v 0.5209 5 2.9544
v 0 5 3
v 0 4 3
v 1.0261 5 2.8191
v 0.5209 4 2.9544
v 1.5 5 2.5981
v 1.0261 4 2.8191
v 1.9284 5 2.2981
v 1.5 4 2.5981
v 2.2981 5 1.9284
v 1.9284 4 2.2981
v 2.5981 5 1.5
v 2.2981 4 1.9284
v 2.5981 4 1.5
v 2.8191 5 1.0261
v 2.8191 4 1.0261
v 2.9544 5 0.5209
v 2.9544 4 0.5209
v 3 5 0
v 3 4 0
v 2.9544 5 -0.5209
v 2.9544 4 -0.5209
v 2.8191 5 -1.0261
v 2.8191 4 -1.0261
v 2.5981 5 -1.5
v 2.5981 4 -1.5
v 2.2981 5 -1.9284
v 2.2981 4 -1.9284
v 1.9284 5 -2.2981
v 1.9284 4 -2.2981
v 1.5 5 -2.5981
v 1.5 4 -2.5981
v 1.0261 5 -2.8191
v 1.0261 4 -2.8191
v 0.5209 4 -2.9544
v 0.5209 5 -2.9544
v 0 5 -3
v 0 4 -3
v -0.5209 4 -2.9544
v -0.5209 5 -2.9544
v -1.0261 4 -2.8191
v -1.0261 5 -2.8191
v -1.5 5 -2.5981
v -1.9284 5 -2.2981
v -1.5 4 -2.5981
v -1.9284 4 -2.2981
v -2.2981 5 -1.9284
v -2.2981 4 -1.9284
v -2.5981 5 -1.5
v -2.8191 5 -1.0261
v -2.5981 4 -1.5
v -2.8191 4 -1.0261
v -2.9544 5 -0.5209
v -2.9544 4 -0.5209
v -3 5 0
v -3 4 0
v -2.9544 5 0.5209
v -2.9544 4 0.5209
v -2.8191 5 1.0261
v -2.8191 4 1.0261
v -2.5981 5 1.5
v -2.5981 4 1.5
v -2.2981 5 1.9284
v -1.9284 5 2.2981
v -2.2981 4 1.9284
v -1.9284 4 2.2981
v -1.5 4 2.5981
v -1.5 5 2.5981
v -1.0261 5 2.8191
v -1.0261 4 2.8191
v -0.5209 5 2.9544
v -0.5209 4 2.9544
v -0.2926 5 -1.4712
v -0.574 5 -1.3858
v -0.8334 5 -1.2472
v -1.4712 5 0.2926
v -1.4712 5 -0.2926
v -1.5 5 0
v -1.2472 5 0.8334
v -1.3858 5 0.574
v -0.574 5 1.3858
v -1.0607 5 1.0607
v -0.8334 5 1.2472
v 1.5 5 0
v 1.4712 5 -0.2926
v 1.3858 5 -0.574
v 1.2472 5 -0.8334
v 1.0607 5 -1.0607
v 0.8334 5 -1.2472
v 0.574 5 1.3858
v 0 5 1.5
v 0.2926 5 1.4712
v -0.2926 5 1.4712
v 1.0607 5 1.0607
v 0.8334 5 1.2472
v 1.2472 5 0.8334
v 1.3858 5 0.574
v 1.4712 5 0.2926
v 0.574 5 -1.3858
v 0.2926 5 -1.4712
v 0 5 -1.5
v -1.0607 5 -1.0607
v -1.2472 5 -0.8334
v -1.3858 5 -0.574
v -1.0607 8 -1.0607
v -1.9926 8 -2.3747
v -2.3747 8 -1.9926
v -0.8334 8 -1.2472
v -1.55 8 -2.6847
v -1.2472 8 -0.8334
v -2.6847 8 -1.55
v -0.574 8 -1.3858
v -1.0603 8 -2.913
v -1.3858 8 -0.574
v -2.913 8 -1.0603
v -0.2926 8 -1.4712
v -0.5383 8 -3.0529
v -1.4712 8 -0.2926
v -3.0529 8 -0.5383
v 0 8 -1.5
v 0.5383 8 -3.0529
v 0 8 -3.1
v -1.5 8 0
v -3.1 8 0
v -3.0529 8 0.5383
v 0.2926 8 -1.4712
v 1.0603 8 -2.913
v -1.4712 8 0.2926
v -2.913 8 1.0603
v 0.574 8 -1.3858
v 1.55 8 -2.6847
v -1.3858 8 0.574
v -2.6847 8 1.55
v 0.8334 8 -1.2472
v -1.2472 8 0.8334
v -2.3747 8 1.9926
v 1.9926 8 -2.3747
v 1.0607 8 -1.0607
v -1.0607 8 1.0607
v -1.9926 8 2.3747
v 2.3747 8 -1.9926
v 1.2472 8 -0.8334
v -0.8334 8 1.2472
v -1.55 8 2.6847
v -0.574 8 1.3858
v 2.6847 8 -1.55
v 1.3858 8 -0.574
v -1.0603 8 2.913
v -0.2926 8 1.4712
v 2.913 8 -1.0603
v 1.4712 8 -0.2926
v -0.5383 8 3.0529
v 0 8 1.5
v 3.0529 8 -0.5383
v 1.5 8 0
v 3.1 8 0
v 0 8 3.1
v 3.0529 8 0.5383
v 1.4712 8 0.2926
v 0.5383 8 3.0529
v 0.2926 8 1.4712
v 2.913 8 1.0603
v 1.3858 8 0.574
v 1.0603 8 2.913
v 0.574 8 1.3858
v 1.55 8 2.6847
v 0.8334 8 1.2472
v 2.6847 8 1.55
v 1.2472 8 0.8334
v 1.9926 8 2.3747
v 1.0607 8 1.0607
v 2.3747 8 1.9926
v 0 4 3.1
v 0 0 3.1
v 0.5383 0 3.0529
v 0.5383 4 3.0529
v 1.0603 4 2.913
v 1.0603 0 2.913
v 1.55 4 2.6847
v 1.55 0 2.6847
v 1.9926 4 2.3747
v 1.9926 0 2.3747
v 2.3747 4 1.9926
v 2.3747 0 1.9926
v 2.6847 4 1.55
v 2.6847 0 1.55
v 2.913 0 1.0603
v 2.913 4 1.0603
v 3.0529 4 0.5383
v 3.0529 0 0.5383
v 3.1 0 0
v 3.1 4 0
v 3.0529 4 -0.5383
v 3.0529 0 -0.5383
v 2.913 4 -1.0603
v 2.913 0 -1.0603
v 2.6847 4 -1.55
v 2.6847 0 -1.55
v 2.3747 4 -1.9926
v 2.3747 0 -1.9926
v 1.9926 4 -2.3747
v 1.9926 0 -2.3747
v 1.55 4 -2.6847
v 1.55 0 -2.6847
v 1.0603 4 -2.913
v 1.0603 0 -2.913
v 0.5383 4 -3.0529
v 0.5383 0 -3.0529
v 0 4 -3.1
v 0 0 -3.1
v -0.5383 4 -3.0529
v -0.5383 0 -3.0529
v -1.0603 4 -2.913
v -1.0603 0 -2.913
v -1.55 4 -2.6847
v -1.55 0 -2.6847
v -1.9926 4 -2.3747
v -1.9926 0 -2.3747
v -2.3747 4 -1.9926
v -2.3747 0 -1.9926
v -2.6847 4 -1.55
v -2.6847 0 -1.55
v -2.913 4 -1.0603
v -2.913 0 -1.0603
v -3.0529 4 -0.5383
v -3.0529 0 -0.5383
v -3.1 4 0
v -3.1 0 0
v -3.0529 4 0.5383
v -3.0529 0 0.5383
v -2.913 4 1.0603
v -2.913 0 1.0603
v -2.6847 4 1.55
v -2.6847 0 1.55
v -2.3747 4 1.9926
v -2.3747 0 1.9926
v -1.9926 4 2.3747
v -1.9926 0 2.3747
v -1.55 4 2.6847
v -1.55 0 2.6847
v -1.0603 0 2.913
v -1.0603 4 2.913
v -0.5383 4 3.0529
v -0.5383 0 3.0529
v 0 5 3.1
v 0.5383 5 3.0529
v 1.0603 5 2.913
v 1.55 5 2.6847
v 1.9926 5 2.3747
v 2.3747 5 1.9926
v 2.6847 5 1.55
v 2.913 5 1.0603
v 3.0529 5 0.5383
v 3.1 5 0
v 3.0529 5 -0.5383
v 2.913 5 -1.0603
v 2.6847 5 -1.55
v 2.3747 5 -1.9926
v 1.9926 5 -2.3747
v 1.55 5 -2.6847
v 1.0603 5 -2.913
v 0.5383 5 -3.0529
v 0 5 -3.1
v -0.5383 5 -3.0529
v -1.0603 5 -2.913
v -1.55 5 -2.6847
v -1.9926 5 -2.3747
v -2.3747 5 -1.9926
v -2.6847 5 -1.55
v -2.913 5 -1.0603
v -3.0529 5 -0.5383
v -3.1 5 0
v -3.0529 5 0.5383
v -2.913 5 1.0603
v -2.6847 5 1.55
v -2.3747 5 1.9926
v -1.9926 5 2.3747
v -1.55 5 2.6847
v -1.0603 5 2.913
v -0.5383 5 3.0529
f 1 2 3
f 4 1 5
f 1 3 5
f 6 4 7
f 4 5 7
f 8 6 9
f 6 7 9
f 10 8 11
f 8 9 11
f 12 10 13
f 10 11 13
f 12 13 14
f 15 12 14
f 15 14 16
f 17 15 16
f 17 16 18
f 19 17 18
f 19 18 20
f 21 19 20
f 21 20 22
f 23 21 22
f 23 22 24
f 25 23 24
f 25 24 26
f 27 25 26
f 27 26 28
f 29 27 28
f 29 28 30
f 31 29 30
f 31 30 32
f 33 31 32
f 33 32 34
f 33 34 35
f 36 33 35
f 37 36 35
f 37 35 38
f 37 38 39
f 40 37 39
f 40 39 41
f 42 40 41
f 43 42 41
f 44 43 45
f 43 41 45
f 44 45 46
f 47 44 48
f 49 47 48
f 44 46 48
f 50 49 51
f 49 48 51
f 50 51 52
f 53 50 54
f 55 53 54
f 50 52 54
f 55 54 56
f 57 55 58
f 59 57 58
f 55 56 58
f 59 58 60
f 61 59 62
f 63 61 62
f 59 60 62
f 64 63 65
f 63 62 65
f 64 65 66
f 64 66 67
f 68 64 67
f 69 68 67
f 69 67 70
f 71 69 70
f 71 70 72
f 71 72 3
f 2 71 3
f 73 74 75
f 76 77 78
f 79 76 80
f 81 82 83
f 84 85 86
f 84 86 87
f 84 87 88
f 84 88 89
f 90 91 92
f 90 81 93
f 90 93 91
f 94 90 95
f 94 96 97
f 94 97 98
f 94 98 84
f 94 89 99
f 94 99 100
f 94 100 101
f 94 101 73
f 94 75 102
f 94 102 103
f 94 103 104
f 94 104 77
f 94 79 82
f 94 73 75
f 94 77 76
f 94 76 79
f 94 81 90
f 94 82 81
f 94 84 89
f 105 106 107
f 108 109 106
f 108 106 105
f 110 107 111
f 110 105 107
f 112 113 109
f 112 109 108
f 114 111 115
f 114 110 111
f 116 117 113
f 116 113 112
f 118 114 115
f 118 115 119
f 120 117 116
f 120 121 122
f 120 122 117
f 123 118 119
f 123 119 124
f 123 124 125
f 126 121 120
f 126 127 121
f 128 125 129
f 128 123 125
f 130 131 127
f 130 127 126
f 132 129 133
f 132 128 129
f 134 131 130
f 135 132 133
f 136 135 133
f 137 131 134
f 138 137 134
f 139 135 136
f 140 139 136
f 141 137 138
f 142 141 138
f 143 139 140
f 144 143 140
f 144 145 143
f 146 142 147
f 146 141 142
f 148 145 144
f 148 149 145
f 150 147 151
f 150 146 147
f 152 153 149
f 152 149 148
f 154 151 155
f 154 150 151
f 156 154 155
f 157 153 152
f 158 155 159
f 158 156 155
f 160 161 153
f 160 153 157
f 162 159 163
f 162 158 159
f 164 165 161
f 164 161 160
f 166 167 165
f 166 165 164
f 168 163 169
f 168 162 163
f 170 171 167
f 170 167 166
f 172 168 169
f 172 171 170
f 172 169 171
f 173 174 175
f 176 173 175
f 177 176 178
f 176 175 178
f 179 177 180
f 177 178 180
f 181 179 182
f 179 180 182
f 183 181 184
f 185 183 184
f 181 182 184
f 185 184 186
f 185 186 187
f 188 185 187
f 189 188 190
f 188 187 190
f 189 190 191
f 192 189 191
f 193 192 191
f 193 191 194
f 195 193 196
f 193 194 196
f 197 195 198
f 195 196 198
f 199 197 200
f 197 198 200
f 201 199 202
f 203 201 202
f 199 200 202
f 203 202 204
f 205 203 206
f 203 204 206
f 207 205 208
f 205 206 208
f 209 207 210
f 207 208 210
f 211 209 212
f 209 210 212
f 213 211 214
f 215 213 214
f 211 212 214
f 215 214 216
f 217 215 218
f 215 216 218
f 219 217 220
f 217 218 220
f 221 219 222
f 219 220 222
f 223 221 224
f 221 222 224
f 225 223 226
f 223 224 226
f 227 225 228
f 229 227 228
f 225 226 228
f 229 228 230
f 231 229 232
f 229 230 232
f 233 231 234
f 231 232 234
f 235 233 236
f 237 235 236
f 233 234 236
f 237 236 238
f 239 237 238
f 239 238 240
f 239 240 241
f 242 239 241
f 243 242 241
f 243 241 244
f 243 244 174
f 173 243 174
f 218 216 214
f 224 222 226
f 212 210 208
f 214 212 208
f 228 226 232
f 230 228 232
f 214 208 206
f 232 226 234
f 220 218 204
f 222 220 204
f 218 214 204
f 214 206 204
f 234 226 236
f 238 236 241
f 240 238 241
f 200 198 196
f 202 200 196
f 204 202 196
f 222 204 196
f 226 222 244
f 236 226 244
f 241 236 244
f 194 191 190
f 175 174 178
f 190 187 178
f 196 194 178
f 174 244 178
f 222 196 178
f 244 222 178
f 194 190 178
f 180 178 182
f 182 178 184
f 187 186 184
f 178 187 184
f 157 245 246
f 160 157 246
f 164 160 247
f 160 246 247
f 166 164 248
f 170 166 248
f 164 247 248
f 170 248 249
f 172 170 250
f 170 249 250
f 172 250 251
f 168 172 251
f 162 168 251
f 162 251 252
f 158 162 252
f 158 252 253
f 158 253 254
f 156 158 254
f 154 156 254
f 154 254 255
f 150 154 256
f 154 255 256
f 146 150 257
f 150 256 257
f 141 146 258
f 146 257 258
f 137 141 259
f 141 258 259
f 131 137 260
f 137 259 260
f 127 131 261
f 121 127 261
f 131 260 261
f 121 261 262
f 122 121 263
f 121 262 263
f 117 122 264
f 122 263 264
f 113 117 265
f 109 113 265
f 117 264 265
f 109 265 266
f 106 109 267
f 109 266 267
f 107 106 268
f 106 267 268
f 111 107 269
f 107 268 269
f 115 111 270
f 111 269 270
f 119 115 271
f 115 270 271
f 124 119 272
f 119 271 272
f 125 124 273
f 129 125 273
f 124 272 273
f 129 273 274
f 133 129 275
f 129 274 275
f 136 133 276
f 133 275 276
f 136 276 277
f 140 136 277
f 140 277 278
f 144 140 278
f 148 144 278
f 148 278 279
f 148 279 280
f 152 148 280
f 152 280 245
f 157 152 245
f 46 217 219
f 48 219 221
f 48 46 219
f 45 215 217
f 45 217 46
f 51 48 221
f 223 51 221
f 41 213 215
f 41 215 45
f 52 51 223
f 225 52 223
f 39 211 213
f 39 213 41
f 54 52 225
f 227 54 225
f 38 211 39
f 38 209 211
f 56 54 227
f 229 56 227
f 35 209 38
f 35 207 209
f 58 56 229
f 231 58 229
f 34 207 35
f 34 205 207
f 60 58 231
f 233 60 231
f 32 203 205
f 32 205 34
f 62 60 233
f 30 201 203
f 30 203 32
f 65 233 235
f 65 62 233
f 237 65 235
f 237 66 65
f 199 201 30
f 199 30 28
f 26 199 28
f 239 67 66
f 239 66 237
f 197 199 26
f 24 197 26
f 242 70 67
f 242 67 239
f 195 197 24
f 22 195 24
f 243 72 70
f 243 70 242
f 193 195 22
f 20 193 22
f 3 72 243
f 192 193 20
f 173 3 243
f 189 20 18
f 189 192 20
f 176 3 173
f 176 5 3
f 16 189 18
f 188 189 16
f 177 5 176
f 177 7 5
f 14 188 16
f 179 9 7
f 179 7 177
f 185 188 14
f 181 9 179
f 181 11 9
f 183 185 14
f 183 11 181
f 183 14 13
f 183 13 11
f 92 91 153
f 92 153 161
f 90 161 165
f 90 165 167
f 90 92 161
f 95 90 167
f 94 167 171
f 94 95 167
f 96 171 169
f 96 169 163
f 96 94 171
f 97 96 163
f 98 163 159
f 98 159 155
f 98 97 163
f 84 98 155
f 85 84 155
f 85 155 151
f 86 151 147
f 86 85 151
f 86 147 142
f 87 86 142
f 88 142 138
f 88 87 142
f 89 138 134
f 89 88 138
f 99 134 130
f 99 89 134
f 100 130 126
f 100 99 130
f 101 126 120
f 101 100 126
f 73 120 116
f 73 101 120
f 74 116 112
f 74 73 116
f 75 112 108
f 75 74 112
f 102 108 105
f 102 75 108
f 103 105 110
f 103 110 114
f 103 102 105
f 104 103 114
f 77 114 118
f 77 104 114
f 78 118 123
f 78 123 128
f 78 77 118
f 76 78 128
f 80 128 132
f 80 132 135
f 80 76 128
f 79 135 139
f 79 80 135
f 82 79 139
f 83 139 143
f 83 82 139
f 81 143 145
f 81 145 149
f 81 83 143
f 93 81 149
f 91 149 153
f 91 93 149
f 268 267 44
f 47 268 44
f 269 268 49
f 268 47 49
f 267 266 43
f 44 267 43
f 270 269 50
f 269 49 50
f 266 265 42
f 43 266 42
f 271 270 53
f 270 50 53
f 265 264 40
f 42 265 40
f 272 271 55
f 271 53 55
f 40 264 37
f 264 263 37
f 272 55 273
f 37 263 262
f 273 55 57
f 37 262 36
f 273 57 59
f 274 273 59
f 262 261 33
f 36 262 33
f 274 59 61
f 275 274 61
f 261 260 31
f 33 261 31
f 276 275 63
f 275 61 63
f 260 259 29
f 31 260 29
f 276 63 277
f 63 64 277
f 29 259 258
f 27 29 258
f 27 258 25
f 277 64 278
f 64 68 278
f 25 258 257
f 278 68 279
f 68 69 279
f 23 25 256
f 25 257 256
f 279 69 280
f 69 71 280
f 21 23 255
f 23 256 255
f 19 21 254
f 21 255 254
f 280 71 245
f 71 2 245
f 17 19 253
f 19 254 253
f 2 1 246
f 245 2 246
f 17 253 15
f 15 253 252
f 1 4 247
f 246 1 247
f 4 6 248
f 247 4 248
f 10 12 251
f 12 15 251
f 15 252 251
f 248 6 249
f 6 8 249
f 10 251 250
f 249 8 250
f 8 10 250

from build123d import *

# Parameters (mm, degrees)
SCHIZZO1_R                   = 3.1
ESTRUSIONE_ESTRUSIONE1_DEPTH = 4
SCHIZZO1_3_R                 = 3
ESTRUSIONE_ESTRUSIONE2_DEPTH = 5
ESTRUSIONE_ESTRUSIONE3_START = 5
SCHIZZO1_4_R                 = 3.1
SCHIZZO1_4_R_2               = 1.5
ESTRUSIONE_ESTRUSIONE3_DEPTH = 3


with BuildPart() as part:
    # Schizzo1 → Estrusione-Estrusione1 (new body)
    with BuildSketch(Plane(origin=(0, 0, 0), x_dir=(1, 0, 0), z_dir=(0, 1, 0))):
        with Locations(Location((0, 0, 0), (0, 0, 270))):
            Circle(SCHIZZO1_R)
    extrude(amount=ESTRUSIONE_ESTRUSIONE1_DEPTH)

    # Schizzo1<3> → Estrusione-Estrusione2 (add)
    with BuildSketch(Plane(origin=(0, 0, 0), x_dir=(1, 0, 0), z_dir=(0, 1, 0))):
        with Locations(Location((0, 0, 0), (0, 0, 270))):
            Circle(SCHIZZO1_3_R)
    extrude(amount=ESTRUSIONE_ESTRUSIONE2_DEPTH)

    # Schizzo1<4> → Estrusione-Estrusione3 (add)
    with BuildSketch(Plane(origin=(0, 0, 0), x_dir=(1, 0, 0), z_dir=(0, 1, 0)).offset(ESTRUSIONE_ESTRUSIONE3_START)):
        with Locations(Location((0, 0, 0), (0, 0, 270))):
            Circle(SCHIZZO1_4_R)
        with Locations(Location((0, 0, 0), (0, 0, 270))):
            Circle(SCHIZZO1_4_R_2, mode=Mode.SUBTRACT)
    extrude(amount=ESTRUSIONE_ESTRUSIONE3_DEPTH)


solid = part.part
